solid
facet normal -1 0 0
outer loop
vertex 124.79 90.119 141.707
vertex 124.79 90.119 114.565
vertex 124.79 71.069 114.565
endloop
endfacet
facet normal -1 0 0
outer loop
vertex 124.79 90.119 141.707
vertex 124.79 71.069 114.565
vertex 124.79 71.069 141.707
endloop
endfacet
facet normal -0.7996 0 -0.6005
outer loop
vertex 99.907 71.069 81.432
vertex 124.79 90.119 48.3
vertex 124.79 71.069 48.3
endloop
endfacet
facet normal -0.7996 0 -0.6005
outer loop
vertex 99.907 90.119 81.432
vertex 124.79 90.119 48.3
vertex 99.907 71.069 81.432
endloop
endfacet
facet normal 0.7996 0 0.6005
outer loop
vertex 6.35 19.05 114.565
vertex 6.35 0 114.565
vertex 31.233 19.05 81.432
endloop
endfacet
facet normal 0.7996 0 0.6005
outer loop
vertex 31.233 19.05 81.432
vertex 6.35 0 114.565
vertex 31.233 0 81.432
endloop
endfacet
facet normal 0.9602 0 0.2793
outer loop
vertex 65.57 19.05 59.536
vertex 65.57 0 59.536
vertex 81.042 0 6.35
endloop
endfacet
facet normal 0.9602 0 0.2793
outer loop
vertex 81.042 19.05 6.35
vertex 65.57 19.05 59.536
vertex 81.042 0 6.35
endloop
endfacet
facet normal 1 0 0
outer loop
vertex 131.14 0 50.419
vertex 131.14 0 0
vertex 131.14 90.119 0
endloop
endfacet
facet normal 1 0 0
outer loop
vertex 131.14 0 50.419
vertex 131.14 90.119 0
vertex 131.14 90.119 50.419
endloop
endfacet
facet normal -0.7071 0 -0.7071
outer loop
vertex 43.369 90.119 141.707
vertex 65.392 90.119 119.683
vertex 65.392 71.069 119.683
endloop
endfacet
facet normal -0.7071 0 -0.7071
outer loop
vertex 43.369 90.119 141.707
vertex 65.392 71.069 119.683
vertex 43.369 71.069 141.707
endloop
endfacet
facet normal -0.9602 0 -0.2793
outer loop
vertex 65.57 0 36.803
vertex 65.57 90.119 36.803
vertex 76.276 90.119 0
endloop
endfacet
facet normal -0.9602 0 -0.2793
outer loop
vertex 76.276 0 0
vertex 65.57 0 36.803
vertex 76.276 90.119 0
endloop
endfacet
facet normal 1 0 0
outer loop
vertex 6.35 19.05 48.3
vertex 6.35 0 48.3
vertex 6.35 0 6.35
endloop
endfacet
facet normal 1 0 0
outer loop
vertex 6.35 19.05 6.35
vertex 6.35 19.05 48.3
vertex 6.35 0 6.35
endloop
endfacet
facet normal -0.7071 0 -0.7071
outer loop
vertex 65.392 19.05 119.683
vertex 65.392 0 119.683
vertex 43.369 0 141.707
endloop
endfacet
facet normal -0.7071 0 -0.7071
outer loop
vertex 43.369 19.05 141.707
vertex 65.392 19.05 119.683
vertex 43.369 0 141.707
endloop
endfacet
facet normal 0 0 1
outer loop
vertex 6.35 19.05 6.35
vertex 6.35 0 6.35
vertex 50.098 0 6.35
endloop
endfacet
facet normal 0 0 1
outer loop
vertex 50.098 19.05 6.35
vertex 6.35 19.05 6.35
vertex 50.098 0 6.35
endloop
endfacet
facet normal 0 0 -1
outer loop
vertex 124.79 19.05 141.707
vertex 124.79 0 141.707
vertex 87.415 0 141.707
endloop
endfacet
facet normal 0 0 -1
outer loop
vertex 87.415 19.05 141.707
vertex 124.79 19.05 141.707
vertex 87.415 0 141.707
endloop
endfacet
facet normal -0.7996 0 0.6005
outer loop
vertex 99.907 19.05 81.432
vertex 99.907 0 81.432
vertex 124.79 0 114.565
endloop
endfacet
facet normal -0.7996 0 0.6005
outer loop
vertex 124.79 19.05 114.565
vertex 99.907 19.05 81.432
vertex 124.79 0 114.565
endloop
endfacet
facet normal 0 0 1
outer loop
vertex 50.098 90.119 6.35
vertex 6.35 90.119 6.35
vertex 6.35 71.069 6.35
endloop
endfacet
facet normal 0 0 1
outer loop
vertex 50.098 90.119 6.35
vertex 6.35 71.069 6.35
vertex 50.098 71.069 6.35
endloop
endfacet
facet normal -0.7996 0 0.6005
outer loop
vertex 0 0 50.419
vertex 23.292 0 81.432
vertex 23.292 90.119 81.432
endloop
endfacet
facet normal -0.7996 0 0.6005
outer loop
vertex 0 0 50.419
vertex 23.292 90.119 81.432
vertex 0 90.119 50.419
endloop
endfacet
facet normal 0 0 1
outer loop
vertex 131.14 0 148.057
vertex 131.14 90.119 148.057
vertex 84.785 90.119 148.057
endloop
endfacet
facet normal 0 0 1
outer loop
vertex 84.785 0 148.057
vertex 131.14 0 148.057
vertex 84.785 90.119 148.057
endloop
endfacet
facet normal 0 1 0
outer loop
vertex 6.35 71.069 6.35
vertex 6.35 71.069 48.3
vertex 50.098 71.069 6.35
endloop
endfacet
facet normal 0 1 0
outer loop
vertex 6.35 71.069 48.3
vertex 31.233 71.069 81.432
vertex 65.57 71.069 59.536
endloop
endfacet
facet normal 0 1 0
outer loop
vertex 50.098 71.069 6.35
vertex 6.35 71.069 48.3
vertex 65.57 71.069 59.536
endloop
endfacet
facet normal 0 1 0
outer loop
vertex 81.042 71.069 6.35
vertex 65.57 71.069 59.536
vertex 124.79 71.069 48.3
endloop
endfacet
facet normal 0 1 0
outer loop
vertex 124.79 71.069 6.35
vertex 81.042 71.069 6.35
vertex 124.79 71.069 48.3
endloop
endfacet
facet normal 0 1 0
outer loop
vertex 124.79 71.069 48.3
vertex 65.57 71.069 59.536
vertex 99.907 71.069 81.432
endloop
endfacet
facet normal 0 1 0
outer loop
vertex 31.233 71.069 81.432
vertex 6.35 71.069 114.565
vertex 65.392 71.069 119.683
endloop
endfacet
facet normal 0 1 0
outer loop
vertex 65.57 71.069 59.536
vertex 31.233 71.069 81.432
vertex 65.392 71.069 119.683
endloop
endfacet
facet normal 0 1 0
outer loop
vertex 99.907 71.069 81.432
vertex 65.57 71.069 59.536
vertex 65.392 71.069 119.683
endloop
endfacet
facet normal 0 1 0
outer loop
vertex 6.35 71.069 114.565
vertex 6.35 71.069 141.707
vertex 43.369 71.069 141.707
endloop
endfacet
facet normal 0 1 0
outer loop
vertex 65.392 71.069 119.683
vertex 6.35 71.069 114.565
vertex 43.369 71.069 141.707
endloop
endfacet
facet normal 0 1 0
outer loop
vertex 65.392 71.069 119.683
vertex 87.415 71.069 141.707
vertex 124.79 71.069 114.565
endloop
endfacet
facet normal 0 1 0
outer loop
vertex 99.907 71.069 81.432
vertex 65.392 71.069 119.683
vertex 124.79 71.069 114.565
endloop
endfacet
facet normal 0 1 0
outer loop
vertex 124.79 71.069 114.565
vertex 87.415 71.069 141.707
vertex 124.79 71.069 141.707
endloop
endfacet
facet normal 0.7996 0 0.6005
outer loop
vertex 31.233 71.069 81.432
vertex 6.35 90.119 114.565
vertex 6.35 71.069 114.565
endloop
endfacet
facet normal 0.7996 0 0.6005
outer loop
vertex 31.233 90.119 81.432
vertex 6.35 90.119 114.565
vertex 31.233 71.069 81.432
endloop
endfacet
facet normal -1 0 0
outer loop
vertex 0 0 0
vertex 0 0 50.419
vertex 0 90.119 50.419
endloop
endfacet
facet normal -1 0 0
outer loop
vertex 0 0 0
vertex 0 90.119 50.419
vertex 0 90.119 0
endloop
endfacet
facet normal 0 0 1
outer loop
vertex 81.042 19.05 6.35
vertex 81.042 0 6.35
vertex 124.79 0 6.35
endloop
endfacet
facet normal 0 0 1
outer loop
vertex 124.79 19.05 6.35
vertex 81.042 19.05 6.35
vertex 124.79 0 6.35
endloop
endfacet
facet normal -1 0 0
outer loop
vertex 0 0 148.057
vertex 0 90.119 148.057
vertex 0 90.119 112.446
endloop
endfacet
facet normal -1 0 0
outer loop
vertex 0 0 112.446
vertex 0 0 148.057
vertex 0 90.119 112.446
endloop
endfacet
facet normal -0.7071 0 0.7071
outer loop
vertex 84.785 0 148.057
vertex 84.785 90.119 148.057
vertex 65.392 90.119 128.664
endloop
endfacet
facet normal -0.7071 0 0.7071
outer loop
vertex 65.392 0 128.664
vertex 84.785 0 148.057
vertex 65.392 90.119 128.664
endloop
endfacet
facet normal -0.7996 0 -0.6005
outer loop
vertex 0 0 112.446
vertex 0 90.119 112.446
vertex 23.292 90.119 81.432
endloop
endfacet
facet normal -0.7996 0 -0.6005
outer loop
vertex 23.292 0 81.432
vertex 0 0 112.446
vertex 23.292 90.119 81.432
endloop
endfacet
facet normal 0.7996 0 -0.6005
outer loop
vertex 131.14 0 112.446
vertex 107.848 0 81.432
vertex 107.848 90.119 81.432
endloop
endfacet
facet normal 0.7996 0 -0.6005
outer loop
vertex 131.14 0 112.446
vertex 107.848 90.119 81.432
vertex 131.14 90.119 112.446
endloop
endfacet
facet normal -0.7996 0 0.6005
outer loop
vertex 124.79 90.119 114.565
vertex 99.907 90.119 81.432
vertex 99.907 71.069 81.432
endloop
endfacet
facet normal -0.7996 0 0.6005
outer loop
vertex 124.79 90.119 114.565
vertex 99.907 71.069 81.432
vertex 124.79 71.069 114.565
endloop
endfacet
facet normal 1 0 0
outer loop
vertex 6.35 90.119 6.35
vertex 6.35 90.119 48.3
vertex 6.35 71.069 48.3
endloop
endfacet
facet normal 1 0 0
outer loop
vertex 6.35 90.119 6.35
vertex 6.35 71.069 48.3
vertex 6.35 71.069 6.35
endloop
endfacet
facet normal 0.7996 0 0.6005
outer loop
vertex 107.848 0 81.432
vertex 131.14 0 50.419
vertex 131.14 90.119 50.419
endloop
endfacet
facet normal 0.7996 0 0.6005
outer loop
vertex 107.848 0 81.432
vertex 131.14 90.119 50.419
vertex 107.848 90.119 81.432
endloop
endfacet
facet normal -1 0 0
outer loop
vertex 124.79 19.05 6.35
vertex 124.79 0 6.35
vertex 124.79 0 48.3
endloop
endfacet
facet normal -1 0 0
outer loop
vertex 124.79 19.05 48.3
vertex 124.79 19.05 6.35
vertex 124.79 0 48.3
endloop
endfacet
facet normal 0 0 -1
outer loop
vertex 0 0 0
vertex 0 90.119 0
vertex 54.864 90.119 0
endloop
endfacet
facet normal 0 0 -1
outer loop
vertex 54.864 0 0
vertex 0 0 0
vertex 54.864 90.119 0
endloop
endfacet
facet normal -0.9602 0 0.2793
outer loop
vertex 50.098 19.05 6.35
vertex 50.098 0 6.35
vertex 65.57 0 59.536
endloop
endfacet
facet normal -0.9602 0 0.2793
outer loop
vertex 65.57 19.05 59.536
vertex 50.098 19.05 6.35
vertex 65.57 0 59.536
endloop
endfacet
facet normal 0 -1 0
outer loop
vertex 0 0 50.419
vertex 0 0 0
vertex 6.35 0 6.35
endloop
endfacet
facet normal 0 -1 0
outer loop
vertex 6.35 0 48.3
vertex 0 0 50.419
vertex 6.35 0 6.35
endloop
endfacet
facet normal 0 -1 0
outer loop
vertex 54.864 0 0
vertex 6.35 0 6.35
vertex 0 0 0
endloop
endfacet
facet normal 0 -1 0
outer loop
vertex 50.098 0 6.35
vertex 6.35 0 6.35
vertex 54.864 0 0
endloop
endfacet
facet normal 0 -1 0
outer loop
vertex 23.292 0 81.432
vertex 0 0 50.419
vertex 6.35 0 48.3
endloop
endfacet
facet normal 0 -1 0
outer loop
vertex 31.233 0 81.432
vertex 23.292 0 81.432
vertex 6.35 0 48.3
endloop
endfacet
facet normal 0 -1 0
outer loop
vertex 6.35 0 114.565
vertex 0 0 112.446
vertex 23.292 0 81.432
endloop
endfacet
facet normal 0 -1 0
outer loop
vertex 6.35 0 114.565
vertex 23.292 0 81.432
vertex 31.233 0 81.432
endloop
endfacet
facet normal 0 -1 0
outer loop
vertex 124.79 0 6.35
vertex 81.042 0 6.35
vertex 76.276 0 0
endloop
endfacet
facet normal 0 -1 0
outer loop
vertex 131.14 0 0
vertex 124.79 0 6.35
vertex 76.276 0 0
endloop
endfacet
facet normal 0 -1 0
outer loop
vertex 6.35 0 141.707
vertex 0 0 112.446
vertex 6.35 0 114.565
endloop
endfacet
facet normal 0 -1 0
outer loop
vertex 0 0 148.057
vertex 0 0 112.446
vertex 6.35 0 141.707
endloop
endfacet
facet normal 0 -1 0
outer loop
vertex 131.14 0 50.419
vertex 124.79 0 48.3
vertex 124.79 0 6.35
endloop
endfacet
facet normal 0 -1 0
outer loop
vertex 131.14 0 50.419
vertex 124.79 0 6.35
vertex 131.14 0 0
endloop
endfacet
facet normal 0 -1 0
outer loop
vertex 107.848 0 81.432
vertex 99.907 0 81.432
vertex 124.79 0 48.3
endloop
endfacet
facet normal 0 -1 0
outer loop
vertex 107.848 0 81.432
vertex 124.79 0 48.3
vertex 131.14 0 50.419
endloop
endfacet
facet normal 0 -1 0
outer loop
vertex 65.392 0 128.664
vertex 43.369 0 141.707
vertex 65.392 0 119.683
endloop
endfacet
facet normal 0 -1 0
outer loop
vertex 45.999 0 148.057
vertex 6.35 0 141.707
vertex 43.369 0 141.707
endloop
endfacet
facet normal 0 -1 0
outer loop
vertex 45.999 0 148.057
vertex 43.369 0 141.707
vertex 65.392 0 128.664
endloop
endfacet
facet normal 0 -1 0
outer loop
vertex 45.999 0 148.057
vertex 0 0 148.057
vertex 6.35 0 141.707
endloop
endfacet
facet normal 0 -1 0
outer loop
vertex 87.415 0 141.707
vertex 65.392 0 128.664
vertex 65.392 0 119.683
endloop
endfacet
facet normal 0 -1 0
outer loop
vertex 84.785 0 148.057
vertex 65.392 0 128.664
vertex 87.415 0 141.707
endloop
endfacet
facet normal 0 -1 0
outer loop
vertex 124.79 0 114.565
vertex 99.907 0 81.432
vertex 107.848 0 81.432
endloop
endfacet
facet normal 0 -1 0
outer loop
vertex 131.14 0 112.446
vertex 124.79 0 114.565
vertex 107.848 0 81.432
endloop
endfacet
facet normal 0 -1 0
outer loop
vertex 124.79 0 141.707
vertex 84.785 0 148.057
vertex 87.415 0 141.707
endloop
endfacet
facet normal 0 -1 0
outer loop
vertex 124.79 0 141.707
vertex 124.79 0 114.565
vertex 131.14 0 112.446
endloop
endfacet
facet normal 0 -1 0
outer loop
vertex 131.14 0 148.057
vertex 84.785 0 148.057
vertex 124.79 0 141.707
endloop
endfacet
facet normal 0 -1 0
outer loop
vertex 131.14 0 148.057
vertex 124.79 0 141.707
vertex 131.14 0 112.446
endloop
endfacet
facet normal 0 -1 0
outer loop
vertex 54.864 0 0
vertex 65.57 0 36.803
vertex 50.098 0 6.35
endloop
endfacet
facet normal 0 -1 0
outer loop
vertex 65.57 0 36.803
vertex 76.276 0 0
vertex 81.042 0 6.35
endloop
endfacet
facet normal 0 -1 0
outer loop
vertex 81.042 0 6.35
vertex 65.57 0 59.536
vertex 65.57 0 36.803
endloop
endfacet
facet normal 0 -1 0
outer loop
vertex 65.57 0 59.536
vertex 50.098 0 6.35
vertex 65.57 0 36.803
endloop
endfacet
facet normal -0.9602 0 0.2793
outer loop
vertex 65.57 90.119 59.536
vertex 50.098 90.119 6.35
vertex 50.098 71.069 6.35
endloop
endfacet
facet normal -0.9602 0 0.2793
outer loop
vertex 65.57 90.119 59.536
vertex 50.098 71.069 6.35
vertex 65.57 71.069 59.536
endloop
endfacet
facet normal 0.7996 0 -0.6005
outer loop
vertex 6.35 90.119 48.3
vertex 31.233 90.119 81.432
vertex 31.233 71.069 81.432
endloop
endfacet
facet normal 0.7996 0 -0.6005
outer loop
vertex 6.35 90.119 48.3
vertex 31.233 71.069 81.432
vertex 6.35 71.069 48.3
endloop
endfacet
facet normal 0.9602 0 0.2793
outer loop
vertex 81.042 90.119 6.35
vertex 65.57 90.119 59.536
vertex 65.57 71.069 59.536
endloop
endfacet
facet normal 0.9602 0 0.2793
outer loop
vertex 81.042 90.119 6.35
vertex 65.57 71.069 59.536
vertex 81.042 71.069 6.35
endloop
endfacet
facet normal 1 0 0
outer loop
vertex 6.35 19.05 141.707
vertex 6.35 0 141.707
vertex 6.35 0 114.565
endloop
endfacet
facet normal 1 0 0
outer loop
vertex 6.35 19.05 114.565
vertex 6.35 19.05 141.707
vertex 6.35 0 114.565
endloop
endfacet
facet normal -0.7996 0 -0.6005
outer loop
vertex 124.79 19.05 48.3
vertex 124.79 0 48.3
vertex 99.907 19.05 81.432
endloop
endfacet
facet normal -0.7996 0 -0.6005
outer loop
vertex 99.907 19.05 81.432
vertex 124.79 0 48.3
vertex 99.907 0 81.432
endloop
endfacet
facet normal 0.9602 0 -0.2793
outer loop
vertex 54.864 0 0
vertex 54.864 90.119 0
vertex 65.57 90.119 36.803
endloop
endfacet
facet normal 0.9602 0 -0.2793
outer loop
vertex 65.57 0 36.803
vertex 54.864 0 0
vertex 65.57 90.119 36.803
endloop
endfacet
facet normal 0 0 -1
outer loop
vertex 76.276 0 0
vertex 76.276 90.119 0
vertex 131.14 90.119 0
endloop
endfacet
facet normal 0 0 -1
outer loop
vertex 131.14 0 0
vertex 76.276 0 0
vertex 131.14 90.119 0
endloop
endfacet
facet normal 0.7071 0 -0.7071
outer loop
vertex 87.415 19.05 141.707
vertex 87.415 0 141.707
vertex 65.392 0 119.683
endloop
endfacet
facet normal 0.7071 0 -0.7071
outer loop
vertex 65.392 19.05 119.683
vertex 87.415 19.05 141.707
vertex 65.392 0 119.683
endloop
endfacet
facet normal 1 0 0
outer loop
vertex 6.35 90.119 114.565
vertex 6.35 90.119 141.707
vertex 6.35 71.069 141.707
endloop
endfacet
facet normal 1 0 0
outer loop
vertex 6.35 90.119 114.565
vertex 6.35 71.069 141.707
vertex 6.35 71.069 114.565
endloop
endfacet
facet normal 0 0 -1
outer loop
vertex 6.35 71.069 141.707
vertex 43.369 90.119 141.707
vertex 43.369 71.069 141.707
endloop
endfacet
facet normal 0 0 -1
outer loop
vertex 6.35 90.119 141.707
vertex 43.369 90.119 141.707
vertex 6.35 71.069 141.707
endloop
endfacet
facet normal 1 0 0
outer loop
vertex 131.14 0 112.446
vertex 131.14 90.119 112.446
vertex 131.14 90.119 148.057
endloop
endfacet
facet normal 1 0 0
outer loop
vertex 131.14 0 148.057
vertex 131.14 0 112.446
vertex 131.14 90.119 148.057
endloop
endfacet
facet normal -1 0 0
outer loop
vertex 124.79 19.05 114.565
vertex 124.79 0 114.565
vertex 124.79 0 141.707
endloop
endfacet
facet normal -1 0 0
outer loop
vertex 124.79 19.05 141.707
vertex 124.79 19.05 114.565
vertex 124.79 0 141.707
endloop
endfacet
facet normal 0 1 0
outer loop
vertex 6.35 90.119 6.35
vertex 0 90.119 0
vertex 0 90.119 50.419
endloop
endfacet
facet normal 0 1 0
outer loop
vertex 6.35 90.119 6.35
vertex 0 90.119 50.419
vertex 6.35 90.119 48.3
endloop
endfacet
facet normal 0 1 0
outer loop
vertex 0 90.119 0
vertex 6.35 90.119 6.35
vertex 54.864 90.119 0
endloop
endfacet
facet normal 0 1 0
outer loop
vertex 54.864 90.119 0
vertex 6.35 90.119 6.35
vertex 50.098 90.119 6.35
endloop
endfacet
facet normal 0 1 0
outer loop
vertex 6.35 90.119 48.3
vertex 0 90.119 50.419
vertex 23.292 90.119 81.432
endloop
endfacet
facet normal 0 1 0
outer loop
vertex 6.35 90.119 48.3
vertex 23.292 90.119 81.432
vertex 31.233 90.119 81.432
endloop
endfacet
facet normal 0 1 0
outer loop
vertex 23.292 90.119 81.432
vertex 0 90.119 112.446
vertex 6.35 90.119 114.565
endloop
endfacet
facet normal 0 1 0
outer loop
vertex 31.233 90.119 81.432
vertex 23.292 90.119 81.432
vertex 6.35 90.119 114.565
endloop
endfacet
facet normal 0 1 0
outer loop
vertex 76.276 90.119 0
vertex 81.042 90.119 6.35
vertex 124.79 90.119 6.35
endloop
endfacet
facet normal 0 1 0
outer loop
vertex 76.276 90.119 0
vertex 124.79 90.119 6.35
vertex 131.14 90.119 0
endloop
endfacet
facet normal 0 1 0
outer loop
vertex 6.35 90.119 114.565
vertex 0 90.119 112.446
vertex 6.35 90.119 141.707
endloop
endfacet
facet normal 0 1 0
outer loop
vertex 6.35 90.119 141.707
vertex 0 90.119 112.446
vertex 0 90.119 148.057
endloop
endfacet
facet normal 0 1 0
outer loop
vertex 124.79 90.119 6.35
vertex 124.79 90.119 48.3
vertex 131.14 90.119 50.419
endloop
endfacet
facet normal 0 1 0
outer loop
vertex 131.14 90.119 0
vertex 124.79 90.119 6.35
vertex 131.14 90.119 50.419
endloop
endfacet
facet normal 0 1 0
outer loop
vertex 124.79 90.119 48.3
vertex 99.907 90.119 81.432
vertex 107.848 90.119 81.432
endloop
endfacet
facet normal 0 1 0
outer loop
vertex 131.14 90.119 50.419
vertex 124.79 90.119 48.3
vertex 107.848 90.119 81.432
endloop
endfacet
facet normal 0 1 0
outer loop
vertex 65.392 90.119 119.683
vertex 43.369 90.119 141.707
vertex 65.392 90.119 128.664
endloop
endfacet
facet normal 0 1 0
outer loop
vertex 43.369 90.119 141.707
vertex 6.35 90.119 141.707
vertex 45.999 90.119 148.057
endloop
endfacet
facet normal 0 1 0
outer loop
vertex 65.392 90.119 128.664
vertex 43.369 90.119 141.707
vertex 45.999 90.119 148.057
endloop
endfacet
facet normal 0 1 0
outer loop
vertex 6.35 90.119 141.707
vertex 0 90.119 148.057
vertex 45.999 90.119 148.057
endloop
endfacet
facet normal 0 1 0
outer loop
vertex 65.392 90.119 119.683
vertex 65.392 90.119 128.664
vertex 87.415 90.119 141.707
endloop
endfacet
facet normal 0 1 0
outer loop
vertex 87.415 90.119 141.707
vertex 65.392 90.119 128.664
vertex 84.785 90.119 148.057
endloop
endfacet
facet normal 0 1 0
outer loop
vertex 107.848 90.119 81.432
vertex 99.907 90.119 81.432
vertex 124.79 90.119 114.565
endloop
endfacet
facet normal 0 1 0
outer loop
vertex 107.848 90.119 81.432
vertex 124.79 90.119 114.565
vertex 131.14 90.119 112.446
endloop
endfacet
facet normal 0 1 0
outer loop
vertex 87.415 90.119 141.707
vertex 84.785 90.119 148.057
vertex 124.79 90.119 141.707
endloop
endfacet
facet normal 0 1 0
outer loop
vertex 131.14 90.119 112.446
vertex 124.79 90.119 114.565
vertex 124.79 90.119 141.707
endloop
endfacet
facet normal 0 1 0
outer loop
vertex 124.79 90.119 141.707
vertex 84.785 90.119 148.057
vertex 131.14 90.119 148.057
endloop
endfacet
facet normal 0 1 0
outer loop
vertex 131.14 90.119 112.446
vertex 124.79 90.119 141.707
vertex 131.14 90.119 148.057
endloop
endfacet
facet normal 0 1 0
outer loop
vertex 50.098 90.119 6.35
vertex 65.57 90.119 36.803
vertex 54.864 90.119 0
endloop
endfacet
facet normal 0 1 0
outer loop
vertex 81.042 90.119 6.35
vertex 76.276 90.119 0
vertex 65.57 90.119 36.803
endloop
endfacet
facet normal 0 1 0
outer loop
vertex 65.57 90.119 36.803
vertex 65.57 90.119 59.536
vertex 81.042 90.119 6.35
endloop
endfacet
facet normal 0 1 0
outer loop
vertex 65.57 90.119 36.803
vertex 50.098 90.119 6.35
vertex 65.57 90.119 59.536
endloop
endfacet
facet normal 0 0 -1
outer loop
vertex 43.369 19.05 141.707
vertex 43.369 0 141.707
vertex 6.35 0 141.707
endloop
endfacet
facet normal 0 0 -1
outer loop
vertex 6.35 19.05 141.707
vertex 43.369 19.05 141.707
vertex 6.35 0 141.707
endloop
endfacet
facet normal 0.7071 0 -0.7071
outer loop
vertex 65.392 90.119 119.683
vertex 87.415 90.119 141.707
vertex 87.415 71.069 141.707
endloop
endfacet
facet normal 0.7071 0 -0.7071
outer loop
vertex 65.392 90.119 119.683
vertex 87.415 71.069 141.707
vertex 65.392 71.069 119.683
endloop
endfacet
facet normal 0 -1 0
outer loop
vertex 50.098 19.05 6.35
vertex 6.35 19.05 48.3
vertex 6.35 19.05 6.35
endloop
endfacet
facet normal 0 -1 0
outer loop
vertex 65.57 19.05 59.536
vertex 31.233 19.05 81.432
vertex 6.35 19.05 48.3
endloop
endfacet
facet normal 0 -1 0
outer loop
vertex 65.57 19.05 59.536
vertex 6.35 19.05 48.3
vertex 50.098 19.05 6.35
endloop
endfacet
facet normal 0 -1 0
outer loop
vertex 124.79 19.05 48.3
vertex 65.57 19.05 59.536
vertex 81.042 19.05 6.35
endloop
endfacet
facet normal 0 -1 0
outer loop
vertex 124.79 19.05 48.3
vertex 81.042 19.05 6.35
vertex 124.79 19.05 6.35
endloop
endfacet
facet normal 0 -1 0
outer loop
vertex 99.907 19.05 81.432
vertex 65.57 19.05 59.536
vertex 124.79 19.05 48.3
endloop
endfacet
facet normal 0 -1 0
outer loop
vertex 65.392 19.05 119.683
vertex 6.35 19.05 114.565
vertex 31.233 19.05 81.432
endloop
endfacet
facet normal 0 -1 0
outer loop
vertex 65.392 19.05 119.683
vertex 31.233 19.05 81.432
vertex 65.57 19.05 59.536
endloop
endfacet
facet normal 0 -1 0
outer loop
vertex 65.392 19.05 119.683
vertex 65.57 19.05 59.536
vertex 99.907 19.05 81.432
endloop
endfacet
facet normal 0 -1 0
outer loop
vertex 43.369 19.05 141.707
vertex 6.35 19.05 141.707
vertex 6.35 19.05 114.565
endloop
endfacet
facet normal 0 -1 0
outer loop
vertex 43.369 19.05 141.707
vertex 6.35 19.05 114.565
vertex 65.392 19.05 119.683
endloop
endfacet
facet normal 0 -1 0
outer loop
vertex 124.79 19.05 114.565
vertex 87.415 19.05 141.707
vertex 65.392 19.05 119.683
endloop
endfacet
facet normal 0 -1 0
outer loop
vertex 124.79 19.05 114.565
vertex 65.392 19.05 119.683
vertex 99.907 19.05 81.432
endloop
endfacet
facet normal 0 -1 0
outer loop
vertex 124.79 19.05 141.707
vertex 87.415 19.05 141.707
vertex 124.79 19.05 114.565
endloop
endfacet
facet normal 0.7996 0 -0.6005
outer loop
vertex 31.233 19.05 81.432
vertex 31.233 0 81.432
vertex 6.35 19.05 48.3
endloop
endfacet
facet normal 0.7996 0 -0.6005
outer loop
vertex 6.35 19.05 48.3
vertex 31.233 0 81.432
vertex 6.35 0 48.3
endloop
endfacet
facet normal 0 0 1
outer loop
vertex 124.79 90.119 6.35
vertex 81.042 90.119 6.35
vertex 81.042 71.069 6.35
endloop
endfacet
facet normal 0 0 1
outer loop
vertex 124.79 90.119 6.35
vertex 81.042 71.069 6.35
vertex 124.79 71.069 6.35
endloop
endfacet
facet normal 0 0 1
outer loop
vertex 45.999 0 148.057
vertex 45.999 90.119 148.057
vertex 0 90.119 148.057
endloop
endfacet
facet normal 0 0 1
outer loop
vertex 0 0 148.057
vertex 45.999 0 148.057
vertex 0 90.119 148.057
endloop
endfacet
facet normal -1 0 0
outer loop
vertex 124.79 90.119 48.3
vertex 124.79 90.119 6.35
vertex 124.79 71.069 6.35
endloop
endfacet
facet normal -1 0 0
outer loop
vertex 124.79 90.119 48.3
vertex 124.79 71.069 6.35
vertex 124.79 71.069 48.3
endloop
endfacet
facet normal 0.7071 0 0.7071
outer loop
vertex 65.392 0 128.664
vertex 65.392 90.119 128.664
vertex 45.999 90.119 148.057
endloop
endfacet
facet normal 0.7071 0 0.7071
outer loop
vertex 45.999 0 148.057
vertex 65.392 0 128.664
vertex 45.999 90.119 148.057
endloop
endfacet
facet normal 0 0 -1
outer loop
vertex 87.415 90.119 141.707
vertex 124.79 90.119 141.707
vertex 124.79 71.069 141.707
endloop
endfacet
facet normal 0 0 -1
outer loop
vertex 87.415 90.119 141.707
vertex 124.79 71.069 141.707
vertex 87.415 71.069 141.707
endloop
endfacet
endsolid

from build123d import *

# Parameters (mm, degrees)
F1_DEPTH = 45.0596
F2_DEPTH = 19.05


with BuildPart() as f1:
    # F0 (on Front) → F1 (new body)
    with BuildSketch(Plane.XZ):
        Polygon((0, 50.419), (0, 0), (54.864, 0), (65.5701, 36.8030026051), (76.2762, 0), (131.1402, 0), (131.1402, 50.419), (107.8484138495, 81.4324), (131.1402, 112.4458), (131.1402, 148.0566), (84.7852, 148.0566), (65.3923, 128.6637), (45.9994, 148.0566), (0, 148.0566), (0, 112.4458), (23.2917861505, 81.4324), align=None)
        Polygon((6.35, 114.5647761782), (6.35, 141.7066), (43.3691438789, 141.7066), (65.3923, 119.6834438789), (87.4154561211, 141.7066), (124.7902, 141.7066), (124.7902, 114.5647761782), (99.9070133581, 81.4324), (124.7902, 48.3000238218), (124.7902, 6.35), (81.0421936034, 6.35), (65.5701, 59.5364545624), (50.0980063966, 6.35), (6.35, 6.35), (6.35, 48.3000238218), (31.2331866419, 81.4324), align=None, mode=Mode.SUBTRACT)
        Polygon((43.3691438789, 141.7066), (6.35, 141.7066), (6.35, 114.5647761782), (31.2331866419, 81.4324), (6.35, 48.3000238218), (6.35, 6.35), (50.0980063966, 6.35), (65.5701, 59.5364545624), (81.0421936034, 6.35), (124.7902, 6.35), (124.7902, 48.3000238218), (99.9070133581, 81.4324), (124.7902, 114.5647761782), (124.7902, 141.7066), (87.4154561211, 141.7066), (65.3923, 119.6834438789), align=None)
    extrude(amount=-F1_DEPTH)

    # F0 (on Front) → F2 (cut, symmetric)
    with BuildSketch(Plane.XZ):
        Polygon((43.3691438789, 141.7066), (6.35, 141.7066), (6.35, 114.5647761782), (31.2331866419, 81.4324), (6.35, 48.3000238218), (6.35, 6.35), (50.0980063966, 6.35), (65.5701, 59.5364545624), (81.0421936034, 6.35), (124.7902, 6.35), (124.7902, 48.3000238218), (99.9070133581, 81.4324), (124.7902, 114.5647761782), (124.7902, 141.7066), (87.4154561211, 141.7066), (65.3923, 119.6834438789), align=None)
    extrude(amount=F2_DEPTH, both=True, mode=Mode.SUBTRACT)

    # F3: F1 across face


with BuildPart() as f1_1:
    add(f1.part)
    add(f1.part.mirror(Plane(origin=(65.5739873585, 45.0596, 73.343942561), x_dir=(1, 0, 0), z_dir=(0, 1, 0))))


solid = f1_1.part
